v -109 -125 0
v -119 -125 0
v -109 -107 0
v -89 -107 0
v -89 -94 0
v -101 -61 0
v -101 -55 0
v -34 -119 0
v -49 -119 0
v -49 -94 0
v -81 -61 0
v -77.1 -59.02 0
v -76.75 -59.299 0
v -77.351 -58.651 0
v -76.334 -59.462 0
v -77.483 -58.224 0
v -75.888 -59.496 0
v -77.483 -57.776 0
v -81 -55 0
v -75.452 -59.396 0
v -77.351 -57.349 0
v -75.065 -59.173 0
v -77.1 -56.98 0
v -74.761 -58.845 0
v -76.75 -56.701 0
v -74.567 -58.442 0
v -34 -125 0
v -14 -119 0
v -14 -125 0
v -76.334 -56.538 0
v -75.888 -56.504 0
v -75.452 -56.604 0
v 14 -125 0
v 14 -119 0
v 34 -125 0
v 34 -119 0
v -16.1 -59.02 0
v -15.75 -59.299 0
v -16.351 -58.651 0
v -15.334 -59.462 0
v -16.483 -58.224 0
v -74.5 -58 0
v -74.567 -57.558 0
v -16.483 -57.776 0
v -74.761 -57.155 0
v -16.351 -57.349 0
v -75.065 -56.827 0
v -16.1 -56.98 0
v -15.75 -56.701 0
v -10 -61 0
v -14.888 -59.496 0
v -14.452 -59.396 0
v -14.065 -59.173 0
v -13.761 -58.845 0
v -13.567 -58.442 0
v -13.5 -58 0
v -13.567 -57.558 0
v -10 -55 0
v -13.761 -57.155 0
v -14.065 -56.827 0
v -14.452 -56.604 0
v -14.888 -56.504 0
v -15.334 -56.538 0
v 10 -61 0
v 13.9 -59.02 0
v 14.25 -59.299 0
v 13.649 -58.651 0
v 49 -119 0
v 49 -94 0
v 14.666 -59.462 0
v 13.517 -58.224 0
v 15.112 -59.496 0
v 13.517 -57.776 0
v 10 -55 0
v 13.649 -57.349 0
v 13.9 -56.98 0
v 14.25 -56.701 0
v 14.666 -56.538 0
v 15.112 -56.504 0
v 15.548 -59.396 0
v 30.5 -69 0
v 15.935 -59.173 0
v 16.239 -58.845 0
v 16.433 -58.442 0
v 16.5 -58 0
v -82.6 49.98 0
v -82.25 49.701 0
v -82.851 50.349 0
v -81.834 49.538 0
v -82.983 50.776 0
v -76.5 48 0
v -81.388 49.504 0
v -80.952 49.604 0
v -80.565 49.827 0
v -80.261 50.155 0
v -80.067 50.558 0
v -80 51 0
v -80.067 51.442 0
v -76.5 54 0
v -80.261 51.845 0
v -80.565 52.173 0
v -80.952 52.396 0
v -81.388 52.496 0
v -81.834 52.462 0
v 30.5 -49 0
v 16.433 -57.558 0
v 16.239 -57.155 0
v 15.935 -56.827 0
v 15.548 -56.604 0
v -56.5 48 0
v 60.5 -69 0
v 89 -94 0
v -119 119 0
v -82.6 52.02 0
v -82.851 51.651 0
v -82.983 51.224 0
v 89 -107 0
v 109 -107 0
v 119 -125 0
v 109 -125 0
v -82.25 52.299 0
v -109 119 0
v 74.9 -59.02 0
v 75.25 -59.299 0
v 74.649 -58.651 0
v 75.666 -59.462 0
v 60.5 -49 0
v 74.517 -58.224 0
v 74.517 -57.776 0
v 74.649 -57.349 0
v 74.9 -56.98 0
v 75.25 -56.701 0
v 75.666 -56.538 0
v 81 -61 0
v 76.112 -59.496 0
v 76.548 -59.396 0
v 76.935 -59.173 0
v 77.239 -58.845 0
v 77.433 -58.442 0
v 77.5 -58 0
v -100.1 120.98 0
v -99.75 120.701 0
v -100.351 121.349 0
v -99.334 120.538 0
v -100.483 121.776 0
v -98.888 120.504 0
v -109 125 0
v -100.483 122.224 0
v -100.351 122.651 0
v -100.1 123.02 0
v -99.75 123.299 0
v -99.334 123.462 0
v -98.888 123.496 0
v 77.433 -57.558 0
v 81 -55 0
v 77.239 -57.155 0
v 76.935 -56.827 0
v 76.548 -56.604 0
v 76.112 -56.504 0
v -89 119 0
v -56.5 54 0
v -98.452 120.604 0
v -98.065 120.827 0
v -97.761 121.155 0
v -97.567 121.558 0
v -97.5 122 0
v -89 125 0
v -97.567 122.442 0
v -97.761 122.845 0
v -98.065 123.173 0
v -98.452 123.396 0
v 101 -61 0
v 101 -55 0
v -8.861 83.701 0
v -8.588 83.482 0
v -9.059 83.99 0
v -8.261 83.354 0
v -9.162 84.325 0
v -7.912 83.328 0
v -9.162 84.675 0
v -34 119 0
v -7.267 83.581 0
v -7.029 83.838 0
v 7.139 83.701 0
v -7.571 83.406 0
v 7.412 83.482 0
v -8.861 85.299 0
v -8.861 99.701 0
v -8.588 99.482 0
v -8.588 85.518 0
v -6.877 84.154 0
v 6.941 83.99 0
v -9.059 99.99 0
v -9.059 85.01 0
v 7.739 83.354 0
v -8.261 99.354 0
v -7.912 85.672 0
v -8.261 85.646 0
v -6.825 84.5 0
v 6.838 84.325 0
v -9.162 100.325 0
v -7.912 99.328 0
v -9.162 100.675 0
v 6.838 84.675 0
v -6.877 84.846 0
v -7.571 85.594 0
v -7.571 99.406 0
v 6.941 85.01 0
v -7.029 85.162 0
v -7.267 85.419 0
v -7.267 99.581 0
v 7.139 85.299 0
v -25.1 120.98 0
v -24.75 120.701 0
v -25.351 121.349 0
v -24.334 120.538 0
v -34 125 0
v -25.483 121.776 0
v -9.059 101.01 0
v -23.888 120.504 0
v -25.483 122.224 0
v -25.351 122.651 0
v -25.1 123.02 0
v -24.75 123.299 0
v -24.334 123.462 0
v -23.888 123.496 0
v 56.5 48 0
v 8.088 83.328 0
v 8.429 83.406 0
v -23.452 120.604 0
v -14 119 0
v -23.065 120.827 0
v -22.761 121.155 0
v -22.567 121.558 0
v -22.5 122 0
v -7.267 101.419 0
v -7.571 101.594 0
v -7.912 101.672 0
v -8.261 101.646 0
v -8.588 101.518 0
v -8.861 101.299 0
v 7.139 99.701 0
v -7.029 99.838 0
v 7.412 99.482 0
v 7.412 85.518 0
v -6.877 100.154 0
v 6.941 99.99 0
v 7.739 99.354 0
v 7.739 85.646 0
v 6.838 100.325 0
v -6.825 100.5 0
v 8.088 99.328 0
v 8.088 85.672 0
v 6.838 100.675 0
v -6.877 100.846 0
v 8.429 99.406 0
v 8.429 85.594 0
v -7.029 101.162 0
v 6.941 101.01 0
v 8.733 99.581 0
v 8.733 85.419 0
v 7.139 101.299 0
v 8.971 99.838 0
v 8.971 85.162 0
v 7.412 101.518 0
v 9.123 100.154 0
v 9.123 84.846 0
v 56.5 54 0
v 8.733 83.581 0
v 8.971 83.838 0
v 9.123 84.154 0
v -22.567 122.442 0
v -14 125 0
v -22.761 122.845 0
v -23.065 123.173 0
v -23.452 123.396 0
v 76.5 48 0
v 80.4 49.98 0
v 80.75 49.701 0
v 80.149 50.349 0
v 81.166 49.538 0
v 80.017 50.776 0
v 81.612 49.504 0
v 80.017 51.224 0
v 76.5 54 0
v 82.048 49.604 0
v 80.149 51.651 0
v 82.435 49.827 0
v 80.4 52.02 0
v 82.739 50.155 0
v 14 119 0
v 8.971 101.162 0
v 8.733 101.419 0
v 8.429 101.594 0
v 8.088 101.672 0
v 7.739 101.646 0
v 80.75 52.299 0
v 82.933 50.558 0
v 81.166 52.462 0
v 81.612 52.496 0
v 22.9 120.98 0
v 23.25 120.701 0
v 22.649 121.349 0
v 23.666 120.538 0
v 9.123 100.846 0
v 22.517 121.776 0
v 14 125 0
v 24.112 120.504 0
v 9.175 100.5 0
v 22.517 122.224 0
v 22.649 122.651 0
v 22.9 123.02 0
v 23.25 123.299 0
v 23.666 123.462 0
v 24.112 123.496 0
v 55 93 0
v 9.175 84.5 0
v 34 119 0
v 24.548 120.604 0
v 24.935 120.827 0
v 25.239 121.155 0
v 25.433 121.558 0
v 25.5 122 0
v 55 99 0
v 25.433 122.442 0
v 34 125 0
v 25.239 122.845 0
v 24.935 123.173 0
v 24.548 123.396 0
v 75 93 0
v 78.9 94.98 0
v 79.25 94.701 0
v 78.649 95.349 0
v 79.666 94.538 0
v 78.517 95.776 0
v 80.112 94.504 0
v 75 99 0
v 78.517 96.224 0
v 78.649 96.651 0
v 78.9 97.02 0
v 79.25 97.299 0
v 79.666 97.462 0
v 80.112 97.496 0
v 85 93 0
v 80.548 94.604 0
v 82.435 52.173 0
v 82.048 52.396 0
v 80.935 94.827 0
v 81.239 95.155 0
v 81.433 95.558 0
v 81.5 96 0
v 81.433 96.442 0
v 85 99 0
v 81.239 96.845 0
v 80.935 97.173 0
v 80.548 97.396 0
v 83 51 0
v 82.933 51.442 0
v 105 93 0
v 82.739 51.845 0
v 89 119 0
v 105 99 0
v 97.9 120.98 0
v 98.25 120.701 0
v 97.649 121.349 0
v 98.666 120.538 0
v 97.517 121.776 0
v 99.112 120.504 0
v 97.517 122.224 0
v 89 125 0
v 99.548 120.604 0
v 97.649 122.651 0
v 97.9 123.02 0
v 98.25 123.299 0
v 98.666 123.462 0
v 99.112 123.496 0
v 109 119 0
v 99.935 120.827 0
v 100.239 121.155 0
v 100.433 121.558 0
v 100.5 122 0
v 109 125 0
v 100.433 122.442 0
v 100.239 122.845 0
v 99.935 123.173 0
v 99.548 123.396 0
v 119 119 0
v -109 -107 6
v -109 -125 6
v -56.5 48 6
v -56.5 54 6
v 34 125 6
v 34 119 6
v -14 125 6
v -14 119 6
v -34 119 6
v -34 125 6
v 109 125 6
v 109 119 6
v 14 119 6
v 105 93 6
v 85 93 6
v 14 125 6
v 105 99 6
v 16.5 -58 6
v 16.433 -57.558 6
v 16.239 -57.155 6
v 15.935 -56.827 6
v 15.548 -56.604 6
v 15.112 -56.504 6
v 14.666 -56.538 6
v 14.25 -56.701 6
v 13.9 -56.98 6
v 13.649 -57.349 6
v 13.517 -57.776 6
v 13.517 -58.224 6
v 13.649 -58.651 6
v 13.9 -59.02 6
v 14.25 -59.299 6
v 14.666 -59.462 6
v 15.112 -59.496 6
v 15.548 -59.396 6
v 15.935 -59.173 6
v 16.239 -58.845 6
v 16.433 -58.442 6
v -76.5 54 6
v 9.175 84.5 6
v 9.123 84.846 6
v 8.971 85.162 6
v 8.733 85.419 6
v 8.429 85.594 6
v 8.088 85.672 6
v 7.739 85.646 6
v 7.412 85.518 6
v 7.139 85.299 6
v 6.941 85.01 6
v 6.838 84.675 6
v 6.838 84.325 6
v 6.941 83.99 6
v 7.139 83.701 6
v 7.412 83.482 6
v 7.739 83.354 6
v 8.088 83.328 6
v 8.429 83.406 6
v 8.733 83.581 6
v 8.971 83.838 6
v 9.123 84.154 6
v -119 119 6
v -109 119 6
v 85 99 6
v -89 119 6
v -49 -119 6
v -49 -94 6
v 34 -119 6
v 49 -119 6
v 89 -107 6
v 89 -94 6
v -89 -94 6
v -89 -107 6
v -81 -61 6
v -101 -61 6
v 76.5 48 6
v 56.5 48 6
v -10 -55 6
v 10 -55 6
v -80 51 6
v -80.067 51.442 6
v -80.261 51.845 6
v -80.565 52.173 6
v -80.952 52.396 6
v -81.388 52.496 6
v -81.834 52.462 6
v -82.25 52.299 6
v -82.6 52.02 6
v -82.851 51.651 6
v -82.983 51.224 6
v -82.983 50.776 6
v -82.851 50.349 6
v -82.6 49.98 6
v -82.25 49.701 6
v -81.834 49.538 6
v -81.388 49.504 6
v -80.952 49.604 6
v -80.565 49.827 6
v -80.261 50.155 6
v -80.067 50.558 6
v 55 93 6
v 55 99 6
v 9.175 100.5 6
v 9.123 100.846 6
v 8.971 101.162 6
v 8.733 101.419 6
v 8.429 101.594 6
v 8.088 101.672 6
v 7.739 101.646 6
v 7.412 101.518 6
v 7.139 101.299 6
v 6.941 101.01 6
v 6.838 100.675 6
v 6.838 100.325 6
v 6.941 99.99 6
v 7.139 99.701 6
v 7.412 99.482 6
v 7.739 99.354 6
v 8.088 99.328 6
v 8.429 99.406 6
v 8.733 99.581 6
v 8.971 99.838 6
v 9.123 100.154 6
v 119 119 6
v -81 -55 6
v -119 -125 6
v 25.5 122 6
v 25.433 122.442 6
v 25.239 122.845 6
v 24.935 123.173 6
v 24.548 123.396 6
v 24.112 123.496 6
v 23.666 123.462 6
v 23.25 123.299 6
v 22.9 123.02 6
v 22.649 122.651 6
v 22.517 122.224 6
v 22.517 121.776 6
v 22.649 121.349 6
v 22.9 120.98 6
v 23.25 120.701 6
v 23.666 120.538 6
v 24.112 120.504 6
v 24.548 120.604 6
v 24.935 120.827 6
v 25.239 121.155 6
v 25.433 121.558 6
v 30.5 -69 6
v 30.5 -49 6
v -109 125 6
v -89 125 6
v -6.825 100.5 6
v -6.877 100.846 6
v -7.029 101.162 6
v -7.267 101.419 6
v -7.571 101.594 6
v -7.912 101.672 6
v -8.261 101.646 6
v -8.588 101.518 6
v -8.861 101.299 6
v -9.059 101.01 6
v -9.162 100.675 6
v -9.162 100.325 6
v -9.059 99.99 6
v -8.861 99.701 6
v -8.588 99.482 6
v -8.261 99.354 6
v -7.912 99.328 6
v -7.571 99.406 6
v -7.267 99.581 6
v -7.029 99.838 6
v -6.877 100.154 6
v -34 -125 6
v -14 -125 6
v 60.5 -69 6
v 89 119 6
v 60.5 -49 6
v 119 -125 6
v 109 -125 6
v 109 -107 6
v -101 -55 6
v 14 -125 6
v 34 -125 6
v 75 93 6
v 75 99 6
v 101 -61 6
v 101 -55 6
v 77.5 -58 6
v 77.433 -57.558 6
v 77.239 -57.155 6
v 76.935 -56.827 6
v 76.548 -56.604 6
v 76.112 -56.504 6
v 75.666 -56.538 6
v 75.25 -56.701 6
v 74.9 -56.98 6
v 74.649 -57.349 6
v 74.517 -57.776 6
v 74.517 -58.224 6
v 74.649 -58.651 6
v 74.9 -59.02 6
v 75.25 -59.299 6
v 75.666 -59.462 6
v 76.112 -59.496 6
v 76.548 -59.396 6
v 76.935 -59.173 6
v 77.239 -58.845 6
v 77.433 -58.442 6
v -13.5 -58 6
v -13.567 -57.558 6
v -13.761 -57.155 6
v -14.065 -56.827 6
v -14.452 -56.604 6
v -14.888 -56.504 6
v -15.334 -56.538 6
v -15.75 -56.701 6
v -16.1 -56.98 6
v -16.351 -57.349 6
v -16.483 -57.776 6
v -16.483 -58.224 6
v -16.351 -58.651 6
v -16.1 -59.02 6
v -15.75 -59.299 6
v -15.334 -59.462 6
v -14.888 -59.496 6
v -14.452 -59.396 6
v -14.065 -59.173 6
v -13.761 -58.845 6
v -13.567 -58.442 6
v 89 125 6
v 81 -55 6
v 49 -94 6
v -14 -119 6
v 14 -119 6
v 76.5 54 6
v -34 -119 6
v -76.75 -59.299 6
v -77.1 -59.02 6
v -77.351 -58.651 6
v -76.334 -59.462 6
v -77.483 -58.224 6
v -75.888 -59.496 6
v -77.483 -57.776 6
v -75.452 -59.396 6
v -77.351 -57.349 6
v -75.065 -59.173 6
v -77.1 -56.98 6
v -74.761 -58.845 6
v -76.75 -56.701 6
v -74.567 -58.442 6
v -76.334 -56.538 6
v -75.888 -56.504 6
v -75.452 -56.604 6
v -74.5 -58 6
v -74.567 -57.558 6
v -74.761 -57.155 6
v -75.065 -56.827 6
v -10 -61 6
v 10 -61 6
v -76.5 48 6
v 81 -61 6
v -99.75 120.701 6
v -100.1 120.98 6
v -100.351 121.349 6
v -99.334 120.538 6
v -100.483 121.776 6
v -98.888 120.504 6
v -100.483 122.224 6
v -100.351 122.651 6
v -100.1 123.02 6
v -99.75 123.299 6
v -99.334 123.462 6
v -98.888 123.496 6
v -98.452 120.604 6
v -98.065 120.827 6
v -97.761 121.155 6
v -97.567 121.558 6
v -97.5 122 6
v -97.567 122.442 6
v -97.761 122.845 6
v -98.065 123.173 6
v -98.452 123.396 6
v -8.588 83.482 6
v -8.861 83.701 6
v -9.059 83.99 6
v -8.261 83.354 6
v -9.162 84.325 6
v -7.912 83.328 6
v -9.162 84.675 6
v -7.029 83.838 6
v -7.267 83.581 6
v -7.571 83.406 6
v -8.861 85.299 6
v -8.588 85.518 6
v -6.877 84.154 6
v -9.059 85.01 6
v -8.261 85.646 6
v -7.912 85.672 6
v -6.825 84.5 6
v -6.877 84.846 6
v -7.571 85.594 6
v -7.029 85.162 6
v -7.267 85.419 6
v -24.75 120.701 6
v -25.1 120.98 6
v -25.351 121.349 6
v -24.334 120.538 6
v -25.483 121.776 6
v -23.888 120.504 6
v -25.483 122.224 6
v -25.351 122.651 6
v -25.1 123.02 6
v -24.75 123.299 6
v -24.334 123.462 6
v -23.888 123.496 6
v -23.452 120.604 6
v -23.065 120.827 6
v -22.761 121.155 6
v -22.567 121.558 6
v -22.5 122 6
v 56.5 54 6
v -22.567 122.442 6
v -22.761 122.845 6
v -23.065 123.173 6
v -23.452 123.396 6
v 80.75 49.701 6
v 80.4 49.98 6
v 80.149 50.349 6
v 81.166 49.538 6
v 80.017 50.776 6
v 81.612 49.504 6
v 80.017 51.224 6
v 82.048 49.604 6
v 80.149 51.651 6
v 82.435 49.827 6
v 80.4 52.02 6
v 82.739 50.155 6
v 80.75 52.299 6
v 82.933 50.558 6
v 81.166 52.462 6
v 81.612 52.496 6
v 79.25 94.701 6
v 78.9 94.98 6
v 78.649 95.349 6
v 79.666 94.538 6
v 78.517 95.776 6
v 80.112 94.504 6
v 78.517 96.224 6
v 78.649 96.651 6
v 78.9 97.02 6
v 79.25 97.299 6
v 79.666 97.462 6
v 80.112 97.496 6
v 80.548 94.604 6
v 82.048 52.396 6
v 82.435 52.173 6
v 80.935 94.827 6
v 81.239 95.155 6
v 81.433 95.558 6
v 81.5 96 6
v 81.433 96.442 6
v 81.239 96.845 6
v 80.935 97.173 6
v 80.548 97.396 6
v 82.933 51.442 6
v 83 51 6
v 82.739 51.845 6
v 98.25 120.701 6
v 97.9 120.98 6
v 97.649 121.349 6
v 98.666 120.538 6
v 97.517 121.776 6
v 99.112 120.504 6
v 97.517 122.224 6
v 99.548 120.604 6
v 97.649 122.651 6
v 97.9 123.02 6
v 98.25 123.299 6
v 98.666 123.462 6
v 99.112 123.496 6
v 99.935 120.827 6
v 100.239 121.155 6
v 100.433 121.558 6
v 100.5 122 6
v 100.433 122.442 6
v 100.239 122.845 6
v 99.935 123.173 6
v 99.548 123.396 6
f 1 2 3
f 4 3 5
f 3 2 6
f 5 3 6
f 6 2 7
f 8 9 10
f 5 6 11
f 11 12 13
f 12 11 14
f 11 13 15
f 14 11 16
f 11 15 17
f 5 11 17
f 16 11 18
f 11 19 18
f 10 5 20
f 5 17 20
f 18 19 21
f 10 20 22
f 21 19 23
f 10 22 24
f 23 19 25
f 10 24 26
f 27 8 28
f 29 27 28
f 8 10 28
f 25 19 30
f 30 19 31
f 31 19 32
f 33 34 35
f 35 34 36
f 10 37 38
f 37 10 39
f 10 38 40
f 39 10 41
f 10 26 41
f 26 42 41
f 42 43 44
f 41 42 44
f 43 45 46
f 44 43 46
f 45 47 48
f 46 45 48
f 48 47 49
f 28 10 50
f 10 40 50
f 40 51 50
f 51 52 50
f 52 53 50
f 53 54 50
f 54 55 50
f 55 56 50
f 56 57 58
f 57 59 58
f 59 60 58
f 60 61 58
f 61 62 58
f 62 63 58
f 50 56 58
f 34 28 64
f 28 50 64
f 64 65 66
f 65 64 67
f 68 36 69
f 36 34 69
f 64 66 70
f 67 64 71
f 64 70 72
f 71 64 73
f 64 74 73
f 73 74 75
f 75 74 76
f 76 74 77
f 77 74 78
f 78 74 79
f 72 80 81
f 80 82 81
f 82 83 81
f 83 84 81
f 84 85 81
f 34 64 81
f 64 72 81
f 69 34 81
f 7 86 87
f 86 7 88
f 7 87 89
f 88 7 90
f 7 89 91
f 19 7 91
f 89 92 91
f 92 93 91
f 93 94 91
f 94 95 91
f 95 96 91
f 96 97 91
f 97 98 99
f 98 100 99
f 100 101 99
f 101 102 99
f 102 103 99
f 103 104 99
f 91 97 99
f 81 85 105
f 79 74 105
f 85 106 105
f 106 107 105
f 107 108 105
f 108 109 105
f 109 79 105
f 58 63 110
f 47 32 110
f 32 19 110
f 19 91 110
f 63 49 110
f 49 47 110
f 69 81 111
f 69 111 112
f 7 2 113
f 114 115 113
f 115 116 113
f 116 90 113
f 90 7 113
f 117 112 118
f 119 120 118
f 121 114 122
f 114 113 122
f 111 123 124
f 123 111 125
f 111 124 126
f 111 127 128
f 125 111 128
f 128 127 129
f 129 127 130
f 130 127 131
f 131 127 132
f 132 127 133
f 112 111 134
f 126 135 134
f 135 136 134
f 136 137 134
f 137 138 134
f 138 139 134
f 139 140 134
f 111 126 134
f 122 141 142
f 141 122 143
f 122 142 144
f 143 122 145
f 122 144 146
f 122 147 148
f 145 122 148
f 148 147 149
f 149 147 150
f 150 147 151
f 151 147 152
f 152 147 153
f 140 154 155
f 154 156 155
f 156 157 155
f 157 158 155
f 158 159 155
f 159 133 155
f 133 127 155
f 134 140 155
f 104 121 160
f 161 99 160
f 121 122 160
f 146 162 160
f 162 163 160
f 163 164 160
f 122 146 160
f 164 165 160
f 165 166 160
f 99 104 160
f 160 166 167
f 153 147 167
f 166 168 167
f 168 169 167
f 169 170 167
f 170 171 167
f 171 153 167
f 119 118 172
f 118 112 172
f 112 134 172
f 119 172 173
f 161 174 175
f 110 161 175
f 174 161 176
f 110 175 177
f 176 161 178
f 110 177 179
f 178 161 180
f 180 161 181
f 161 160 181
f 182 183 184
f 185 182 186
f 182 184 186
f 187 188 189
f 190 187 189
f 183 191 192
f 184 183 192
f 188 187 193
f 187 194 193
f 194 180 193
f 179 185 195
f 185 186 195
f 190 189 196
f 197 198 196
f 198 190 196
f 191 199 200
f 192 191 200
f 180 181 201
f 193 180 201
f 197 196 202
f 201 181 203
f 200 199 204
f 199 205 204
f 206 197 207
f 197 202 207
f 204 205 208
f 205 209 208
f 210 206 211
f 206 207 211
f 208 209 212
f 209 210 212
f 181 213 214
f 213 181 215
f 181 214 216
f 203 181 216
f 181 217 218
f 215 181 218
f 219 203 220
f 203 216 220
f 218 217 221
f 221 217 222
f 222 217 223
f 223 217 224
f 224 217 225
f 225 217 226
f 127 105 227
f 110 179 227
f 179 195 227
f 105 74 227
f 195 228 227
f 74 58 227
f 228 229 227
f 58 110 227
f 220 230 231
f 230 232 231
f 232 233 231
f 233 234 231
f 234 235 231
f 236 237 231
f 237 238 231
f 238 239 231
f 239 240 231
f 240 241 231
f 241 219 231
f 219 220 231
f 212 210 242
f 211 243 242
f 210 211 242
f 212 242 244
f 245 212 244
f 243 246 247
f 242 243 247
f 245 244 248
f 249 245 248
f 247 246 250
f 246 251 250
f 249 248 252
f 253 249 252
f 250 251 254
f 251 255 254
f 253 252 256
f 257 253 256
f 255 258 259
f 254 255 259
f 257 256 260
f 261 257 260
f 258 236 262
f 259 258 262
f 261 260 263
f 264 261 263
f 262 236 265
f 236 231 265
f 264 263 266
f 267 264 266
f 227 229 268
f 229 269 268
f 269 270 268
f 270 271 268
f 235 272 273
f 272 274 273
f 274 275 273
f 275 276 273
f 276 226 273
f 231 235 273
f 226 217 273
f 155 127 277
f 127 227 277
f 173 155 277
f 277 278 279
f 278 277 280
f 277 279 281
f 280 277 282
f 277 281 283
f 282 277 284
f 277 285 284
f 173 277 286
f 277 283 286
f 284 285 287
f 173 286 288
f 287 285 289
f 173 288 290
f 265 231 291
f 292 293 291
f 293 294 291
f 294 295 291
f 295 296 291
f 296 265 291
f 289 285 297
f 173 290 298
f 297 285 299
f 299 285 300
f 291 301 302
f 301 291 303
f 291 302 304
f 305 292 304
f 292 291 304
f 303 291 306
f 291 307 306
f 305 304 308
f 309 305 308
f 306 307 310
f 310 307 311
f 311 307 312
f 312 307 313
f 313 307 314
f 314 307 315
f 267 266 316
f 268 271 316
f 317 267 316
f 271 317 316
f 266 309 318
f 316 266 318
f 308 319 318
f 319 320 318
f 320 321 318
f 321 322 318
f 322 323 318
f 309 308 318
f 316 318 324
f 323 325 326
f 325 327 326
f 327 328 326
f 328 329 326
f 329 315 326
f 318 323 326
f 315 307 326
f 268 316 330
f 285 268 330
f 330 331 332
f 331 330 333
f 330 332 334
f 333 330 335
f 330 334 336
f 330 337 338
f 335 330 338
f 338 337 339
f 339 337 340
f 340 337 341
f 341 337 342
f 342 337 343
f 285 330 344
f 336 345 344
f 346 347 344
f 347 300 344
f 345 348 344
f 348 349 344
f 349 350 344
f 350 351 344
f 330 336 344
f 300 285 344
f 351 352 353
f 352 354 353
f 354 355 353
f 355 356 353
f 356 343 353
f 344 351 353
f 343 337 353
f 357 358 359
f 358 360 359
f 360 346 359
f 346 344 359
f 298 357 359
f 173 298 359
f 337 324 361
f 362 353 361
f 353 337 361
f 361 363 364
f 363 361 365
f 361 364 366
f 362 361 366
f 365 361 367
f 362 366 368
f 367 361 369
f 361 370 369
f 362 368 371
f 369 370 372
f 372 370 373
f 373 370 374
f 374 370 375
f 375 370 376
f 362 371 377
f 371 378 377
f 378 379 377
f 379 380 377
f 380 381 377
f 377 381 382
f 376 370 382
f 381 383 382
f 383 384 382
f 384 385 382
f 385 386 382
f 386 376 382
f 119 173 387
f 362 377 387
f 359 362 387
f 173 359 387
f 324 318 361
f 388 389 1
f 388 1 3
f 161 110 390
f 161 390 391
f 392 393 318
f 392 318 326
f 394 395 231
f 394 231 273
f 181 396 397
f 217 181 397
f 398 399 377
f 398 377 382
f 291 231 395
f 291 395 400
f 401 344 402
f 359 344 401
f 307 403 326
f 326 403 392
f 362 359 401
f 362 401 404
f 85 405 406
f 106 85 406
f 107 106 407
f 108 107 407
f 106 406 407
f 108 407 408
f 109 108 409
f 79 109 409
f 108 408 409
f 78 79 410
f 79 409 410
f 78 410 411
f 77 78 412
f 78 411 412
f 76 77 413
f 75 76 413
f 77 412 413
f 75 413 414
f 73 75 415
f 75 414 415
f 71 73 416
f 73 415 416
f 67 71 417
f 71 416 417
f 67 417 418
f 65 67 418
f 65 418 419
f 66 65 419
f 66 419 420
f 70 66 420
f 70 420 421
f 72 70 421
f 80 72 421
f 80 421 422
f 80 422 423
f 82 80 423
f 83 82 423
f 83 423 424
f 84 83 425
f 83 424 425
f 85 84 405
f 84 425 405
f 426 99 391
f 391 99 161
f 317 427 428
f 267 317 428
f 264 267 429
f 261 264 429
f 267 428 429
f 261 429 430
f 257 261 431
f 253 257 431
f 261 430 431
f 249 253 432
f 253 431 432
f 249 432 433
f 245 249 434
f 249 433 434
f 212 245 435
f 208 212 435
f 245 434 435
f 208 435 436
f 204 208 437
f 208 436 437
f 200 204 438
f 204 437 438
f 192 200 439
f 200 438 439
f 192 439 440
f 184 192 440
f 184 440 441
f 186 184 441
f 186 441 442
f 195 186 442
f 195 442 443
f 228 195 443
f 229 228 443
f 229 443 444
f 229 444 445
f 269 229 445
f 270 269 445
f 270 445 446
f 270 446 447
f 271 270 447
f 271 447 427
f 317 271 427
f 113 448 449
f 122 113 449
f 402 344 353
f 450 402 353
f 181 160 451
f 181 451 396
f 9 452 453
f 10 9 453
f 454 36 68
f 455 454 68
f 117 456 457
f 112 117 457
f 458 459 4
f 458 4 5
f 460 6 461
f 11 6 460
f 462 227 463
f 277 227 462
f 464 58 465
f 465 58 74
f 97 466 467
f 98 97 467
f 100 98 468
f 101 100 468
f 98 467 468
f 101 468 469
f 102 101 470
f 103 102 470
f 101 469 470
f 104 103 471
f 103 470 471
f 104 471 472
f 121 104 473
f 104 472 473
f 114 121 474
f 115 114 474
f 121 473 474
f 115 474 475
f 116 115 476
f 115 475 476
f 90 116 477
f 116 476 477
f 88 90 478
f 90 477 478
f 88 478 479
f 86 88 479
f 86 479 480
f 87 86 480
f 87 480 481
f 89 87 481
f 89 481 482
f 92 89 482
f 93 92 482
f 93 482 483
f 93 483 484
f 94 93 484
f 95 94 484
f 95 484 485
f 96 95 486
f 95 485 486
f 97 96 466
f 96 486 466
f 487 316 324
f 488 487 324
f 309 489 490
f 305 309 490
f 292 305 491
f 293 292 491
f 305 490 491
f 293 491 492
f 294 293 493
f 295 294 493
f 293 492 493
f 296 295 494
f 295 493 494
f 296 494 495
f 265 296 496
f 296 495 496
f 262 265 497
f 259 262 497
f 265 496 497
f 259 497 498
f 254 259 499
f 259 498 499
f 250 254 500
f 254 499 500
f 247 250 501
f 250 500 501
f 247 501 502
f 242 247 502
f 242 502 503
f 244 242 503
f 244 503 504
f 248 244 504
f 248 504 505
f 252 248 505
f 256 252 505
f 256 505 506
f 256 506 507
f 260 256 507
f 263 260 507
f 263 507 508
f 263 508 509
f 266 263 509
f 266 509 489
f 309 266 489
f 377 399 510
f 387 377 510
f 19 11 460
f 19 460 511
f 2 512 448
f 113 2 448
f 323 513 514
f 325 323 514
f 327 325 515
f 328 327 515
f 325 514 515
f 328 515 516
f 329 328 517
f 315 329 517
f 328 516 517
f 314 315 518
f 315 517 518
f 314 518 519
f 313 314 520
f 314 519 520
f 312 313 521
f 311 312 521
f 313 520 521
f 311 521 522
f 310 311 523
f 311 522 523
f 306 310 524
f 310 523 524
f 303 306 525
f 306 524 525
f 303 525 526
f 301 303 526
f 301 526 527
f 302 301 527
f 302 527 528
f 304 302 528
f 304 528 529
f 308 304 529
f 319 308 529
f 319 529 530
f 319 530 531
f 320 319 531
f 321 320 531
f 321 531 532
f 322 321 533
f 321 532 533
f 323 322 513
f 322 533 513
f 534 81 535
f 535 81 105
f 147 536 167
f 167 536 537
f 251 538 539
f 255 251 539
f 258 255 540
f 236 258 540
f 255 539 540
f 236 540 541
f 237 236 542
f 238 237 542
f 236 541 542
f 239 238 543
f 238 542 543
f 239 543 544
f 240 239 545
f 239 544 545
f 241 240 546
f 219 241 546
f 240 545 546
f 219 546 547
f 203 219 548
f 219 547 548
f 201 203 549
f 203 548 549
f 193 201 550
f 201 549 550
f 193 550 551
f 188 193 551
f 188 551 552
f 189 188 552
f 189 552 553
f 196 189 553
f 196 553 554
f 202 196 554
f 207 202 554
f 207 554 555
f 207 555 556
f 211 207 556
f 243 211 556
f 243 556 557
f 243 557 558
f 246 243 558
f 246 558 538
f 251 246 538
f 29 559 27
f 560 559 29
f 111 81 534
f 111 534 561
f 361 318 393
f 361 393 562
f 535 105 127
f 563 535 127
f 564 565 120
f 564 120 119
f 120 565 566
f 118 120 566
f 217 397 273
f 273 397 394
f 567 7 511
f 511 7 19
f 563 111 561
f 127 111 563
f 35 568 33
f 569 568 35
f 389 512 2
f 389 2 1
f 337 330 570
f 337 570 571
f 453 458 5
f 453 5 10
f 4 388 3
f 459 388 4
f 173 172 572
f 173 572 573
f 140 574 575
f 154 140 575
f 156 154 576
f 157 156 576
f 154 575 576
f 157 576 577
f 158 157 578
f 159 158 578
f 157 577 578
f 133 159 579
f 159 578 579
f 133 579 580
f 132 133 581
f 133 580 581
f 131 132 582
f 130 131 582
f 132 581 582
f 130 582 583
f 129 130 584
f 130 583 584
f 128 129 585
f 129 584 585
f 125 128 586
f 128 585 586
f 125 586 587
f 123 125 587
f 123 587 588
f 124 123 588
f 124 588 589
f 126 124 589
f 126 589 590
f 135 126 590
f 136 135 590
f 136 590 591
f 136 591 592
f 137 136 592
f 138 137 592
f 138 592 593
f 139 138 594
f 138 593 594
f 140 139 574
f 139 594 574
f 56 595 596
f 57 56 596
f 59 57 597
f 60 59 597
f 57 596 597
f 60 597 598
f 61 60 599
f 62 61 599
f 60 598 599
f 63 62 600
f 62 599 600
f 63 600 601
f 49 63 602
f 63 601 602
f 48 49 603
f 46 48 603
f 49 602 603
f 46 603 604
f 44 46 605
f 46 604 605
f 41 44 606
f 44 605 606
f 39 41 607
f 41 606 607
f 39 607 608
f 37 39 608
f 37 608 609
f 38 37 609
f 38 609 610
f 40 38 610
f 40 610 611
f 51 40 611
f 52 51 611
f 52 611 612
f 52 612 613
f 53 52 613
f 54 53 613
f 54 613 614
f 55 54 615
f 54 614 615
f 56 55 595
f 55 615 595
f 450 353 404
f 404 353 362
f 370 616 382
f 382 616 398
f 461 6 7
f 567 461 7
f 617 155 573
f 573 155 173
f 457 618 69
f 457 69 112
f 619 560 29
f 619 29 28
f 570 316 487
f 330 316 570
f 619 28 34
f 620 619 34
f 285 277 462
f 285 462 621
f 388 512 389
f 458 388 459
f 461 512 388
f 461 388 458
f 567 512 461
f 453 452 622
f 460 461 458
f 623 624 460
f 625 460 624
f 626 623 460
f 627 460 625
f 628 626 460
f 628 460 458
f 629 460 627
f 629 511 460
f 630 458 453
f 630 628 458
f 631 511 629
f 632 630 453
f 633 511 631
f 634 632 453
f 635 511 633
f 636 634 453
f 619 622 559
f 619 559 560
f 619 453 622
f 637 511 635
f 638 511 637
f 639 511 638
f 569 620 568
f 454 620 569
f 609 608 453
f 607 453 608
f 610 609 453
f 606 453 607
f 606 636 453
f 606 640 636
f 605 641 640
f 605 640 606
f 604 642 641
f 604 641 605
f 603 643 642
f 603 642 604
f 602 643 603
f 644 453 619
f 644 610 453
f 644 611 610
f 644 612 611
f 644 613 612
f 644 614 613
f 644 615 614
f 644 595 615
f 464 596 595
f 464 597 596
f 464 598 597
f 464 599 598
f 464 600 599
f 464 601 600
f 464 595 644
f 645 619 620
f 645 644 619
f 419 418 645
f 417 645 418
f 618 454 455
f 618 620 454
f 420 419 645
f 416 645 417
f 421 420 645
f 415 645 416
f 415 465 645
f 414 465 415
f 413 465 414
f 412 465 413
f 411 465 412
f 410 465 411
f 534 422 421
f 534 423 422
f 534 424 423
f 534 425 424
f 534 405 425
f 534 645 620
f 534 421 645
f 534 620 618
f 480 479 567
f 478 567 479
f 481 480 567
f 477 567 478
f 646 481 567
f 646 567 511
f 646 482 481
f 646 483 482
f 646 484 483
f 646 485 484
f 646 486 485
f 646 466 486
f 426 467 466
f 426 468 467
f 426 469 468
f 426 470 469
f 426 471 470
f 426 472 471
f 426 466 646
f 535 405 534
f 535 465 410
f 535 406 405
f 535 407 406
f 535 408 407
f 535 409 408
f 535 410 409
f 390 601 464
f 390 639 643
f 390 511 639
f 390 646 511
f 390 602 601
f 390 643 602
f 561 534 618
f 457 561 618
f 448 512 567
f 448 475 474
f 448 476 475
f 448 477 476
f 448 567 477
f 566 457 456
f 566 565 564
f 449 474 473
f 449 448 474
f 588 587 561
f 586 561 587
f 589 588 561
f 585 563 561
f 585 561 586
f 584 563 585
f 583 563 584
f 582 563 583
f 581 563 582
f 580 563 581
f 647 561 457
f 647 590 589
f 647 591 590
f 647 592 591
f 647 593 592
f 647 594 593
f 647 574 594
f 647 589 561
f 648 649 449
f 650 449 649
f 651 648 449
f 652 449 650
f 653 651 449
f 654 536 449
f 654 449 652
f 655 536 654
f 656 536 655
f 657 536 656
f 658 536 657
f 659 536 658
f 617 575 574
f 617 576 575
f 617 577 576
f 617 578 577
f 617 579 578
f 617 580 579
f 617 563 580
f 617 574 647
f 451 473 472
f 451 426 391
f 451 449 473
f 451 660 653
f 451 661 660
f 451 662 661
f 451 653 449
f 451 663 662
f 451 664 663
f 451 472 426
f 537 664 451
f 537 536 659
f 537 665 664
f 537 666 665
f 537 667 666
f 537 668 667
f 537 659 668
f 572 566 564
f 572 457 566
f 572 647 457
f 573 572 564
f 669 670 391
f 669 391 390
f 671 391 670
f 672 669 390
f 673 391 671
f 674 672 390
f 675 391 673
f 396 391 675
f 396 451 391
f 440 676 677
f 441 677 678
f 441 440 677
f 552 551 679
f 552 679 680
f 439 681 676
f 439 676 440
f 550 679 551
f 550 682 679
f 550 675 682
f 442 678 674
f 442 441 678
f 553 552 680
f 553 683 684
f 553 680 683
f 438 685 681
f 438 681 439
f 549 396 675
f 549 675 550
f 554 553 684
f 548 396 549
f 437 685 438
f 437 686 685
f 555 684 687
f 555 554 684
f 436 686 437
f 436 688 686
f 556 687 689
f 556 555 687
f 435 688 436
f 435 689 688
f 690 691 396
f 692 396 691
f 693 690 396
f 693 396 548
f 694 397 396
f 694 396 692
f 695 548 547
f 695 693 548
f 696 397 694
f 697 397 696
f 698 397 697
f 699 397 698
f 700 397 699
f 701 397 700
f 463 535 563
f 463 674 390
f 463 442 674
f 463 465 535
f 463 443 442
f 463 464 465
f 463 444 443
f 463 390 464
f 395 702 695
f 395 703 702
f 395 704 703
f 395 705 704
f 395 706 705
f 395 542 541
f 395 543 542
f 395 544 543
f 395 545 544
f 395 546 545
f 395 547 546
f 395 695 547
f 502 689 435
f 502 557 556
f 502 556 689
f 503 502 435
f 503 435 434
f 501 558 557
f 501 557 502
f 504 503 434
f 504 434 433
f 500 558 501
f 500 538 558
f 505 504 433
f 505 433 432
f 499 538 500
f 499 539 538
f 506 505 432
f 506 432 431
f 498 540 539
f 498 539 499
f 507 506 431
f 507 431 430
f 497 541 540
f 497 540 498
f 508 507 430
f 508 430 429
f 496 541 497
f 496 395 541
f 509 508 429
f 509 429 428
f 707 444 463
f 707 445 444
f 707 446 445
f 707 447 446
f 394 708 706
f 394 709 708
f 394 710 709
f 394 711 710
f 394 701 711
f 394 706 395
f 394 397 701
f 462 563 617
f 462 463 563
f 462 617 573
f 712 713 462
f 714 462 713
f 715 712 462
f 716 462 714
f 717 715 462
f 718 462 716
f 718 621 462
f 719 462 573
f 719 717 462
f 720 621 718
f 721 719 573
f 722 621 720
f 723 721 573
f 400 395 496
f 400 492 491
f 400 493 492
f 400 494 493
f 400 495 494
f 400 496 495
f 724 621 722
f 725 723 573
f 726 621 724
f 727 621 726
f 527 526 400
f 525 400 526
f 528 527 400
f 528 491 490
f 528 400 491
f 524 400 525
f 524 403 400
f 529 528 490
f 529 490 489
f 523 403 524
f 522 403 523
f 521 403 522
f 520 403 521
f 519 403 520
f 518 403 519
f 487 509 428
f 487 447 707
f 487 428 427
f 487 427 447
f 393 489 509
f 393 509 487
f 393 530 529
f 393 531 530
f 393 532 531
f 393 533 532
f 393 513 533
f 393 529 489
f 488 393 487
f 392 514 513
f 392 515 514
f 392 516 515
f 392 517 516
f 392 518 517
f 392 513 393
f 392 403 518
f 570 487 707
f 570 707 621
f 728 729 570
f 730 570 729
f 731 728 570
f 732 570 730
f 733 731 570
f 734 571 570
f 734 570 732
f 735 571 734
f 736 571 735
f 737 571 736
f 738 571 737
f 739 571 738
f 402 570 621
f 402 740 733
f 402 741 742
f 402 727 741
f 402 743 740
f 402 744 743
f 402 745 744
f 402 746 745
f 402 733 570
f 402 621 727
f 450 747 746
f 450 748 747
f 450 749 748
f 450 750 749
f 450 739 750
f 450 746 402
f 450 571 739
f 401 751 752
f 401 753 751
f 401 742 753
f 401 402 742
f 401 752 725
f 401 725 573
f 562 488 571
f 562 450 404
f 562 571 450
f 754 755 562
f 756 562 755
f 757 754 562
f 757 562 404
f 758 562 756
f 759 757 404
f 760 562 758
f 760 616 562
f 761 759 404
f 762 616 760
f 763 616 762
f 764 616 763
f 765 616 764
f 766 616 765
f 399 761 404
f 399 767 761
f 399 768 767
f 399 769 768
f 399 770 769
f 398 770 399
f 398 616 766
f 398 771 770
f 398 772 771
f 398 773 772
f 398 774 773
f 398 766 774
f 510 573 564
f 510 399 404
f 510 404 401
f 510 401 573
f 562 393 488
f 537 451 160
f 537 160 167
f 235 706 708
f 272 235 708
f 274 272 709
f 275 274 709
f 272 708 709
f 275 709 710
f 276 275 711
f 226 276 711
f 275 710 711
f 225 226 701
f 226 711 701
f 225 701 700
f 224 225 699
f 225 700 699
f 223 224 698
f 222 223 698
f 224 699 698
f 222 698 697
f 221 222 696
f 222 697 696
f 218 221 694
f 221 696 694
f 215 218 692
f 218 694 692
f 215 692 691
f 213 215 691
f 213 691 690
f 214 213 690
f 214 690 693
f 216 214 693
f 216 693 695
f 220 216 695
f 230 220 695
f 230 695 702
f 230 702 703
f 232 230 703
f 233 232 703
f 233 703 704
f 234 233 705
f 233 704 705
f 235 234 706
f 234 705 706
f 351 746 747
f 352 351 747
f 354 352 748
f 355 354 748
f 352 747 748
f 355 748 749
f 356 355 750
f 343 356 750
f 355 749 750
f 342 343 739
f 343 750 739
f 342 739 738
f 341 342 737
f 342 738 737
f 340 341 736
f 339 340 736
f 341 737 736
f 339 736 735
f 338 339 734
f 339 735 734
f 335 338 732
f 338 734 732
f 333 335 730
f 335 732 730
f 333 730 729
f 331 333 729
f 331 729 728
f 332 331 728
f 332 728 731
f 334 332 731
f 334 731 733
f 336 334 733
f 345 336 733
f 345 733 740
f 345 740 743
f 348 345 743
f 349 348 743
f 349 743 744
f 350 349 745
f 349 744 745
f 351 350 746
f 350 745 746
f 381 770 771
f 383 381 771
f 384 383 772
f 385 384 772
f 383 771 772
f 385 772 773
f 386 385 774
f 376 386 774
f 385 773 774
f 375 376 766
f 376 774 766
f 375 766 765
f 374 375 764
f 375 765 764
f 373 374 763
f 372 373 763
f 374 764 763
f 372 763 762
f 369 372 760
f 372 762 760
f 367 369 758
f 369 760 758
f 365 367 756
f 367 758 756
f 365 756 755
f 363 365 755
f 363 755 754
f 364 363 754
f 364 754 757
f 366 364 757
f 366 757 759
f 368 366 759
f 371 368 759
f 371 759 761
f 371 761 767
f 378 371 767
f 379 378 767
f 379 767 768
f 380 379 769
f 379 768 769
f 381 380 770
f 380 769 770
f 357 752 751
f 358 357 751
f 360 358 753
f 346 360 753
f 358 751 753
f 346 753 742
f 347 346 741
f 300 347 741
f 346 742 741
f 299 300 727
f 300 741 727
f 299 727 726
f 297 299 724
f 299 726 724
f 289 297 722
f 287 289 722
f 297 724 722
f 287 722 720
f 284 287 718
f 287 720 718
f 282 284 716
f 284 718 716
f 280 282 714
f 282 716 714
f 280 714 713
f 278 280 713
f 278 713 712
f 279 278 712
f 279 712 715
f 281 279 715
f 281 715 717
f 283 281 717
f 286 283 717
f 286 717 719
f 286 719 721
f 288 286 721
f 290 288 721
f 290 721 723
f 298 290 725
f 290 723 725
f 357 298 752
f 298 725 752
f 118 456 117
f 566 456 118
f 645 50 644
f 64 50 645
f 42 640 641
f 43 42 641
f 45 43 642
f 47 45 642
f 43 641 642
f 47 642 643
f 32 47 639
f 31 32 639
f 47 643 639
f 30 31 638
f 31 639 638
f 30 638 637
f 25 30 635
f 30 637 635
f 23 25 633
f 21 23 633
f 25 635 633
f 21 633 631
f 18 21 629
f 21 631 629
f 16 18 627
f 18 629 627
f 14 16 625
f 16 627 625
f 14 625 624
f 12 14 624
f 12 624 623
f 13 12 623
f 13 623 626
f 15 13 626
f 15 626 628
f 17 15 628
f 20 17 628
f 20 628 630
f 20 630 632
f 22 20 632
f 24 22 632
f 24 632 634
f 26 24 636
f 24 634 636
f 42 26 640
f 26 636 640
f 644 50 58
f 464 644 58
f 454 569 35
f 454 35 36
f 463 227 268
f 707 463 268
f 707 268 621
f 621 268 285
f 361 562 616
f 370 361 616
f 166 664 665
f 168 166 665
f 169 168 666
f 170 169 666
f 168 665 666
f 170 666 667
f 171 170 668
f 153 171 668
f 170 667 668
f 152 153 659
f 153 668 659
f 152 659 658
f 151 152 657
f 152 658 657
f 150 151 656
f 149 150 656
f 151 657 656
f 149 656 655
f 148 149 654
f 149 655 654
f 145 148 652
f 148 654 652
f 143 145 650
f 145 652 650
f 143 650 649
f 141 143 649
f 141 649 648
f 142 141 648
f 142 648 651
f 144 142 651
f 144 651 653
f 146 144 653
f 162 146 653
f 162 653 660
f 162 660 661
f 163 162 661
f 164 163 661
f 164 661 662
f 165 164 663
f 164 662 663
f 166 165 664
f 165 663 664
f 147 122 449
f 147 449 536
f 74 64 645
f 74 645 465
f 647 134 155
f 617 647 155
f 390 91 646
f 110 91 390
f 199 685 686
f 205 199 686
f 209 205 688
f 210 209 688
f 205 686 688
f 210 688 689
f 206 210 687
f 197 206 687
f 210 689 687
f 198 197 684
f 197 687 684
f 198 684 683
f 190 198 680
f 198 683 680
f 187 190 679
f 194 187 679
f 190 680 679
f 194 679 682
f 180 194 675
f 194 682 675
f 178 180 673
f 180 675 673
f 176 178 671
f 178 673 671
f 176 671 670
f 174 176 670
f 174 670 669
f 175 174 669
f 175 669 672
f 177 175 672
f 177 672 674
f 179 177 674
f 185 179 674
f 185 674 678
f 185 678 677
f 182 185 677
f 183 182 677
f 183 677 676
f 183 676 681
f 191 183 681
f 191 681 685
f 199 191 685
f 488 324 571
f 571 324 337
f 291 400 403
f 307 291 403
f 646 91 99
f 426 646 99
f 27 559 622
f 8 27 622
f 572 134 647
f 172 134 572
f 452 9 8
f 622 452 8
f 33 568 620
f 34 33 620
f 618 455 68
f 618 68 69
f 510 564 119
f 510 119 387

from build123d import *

# Parameters (mm, degrees)
ESQUISSE1_W             = 218
ESQUISSE1_H             = 238
ESQUISSE1_W_2           = 20
ESQUISSE1_H_2           = 6
ESQUISSE1_W_3           = 30
ESQUISSE1_H_3           = 20
BOSS_EXTRU_1_DEPTH      = 6
ESQUISSE2_W             = 40
ESQUISSE2_H             = 25
ENL_V_MAT_EXTRU_1_DEPTH = 6
ESQUISSE3_W             = 20
ESQUISSE3_H             = 6
BOSS_EXTRU_3_DEPTH      = 6
ESQUISSE4_R             = 1.5
ENL_V_MAT_EXTRU_2_DEPTH = 6
ESQUISSE5_W             = 10
ESQUISSE5_H             = 244
BOSS_EXTRU_4_DEPTH      = 6
ESQUISSE6_W             = 20
ESQUISSE6_H             = 12
ENL_V_MAT_EXTRU_3_DEPTH = 6
ESQUISSE7_R             = 1.175
ENL_V_MAT_EXTRU_4_DEPTH = 7


with BuildPart() as part:
    # Esquisse1 → Boss.-Extru.1 (new body)
    with BuildSketch(Plane.XY):
        Rectangle(ESQUISSE1_W, ESQUISSE1_H)
        with Locations((-91, -58)):
            Rectangle(ESQUISSE1_W_2, ESQUISSE1_H_2, mode=Mode.SUBTRACT)
        with Locations((0, -58)):
            Rectangle(ESQUISSE1_W_2, ESQUISSE1_H_2, mode=Mode.SUBTRACT)
        with Locations((91, -58)):
            Rectangle(ESQUISSE1_W_2, ESQUISSE1_H_2, mode=Mode.SUBTRACT)
        with Locations((-66.5, 51)):
            Rectangle(ESQUISSE1_W_2, ESQUISSE1_H_2, mode=Mode.SUBTRACT)
        with Locations((66.5, 51)):
            Rectangle(ESQUISSE1_W_2, ESQUISSE1_H_2, mode=Mode.SUBTRACT)
        with Locations((45.5, -59)):
            Rectangle(ESQUISSE1_W_3, ESQUISSE1_H_3, mode=Mode.SUBTRACT)
        with Locations((65, 96)):
            Rectangle(ESQUISSE1_W_2, ESQUISSE1_H_2, mode=Mode.SUBTRACT)
        with Locations((95, 96)):
            Rectangle(ESQUISSE1_W_2, ESQUISSE1_H_2, mode=Mode.SUBTRACT)
    extrude(amount=BOSS_EXTRU_1_DEPTH)

    # Esquisse2 → Enlèv. mat.-Extru.1 (cut)
    with BuildSketch(Plane.XY.offset(6)):
        with Locations((-69, -106.5)):
            Rectangle(ESQUISSE2_W, ESQUISSE2_H)
        with Locations((69, -106.5)):
            Rectangle(ESQUISSE2_W, ESQUISSE2_H)
    extrude(amount=-ENL_V_MAT_EXTRU_1_DEPTH, mode=Mode.SUBTRACT)

    # Esquisse3 → Boss.-Extru.3 (add)
    with BuildSketch(Plane.XY.offset(6)):
        with Locations((-24, -122)):
            Rectangle(ESQUISSE3_W, ESQUISSE3_H)
        with Locations((24, -122)):
            Rectangle(ESQUISSE3_W, ESQUISSE3_H)
        with Locations((24, 122)):
            Rectangle(ESQUISSE3_W, ESQUISSE3_H)
        with Locations((99, 122)):
            Rectangle(ESQUISSE3_W, ESQUISSE3_H)
        with Locations((-24, 122)):
            Rectangle(ESQUISSE3_W, ESQUISSE3_H)
        with Locations((-99, 122)):
            Rectangle(ESQUISSE3_W, ESQUISSE3_H)
    extrude(amount=-BOSS_EXTRU_3_DEPTH)

    # Esquisse4 → Enlèv. mat.-Extru.2 (cut)
    with BuildSketch(Plane.XY.offset(6)):
        with Locations((-15, -58)):
            Circle(ESQUISSE4_R)
        with Locations((-76, -58)):
            Circle(ESQUISSE4_R)
        with Locations((80, 96)):
            Circle(ESQUISSE4_R)
        with Locations((81.5, 51)):
            Circle(ESQUISSE4_R)
        with Locations((76, -58)):
            Circle(ESQUISSE4_R)
        with Locations((15, -58)):
            Circle(ESQUISSE4_R)
        with Locations((-81.5, 51)):
            Circle(ESQUISSE4_R)
        with Locations((-99, 122)):
            Circle(ESQUISSE4_R)
        with Locations((-24, 122)):
            Circle(ESQUISSE4_R)
        with Locations((24, 122)):
            Circle(ESQUISSE4_R)
        with Locations((99, 122)):
            Circle(ESQUISSE4_R)
    extrude(amount=-ENL_V_MAT_EXTRU_2_DEPTH, mode=Mode.SUBTRACT)

    # Esquisse5 → Boss.-Extru.4 (add)
    with BuildSketch(Plane.XY.offset(6)):
        with Locations((-114, -3)):
            Rectangle(ESQUISSE5_W, ESQUISSE5_H)
        with Locations((114, -3)):
            Rectangle(ESQUISSE5_W, ESQUISSE5_H)
    extrude(amount=-BOSS_EXTRU_4_DEPTH)

    # Esquisse6 → Enlèv. mat.-Extru.3 (cut)
    with BuildSketch(Plane.XY.offset(6)):
        with Locations((99, -113)):
            Rectangle(ESQUISSE6_W, ESQUISSE6_H)
        with Locations((-99, -113)):
            Rectangle(ESQUISSE6_W, ESQUISSE6_H)
    extrude(amount=-ENL_V_MAT_EXTRU_3_DEPTH, mode=Mode.SUBTRACT)

    # Esquisse7 → Enlèv. mat.-Extru.4 (cut, through all)
    with BuildSketch(Plane.XY.offset(6)):
        with Locations((-8, 100.5)):
            Circle(ESQUISSE7_R)
        with Locations((8, 100.5)):
            Circle(ESQUISSE7_R)
        with Locations((-8, 84.5)):
            Circle(ESQUISSE7_R)
        with Locations((8, 84.5)):
            Circle(ESQUISSE7_R)
    extrude(amount=-ENL_V_MAT_EXTRU_4_DEPTH, mode=Mode.SUBTRACT)


solid = part.part
